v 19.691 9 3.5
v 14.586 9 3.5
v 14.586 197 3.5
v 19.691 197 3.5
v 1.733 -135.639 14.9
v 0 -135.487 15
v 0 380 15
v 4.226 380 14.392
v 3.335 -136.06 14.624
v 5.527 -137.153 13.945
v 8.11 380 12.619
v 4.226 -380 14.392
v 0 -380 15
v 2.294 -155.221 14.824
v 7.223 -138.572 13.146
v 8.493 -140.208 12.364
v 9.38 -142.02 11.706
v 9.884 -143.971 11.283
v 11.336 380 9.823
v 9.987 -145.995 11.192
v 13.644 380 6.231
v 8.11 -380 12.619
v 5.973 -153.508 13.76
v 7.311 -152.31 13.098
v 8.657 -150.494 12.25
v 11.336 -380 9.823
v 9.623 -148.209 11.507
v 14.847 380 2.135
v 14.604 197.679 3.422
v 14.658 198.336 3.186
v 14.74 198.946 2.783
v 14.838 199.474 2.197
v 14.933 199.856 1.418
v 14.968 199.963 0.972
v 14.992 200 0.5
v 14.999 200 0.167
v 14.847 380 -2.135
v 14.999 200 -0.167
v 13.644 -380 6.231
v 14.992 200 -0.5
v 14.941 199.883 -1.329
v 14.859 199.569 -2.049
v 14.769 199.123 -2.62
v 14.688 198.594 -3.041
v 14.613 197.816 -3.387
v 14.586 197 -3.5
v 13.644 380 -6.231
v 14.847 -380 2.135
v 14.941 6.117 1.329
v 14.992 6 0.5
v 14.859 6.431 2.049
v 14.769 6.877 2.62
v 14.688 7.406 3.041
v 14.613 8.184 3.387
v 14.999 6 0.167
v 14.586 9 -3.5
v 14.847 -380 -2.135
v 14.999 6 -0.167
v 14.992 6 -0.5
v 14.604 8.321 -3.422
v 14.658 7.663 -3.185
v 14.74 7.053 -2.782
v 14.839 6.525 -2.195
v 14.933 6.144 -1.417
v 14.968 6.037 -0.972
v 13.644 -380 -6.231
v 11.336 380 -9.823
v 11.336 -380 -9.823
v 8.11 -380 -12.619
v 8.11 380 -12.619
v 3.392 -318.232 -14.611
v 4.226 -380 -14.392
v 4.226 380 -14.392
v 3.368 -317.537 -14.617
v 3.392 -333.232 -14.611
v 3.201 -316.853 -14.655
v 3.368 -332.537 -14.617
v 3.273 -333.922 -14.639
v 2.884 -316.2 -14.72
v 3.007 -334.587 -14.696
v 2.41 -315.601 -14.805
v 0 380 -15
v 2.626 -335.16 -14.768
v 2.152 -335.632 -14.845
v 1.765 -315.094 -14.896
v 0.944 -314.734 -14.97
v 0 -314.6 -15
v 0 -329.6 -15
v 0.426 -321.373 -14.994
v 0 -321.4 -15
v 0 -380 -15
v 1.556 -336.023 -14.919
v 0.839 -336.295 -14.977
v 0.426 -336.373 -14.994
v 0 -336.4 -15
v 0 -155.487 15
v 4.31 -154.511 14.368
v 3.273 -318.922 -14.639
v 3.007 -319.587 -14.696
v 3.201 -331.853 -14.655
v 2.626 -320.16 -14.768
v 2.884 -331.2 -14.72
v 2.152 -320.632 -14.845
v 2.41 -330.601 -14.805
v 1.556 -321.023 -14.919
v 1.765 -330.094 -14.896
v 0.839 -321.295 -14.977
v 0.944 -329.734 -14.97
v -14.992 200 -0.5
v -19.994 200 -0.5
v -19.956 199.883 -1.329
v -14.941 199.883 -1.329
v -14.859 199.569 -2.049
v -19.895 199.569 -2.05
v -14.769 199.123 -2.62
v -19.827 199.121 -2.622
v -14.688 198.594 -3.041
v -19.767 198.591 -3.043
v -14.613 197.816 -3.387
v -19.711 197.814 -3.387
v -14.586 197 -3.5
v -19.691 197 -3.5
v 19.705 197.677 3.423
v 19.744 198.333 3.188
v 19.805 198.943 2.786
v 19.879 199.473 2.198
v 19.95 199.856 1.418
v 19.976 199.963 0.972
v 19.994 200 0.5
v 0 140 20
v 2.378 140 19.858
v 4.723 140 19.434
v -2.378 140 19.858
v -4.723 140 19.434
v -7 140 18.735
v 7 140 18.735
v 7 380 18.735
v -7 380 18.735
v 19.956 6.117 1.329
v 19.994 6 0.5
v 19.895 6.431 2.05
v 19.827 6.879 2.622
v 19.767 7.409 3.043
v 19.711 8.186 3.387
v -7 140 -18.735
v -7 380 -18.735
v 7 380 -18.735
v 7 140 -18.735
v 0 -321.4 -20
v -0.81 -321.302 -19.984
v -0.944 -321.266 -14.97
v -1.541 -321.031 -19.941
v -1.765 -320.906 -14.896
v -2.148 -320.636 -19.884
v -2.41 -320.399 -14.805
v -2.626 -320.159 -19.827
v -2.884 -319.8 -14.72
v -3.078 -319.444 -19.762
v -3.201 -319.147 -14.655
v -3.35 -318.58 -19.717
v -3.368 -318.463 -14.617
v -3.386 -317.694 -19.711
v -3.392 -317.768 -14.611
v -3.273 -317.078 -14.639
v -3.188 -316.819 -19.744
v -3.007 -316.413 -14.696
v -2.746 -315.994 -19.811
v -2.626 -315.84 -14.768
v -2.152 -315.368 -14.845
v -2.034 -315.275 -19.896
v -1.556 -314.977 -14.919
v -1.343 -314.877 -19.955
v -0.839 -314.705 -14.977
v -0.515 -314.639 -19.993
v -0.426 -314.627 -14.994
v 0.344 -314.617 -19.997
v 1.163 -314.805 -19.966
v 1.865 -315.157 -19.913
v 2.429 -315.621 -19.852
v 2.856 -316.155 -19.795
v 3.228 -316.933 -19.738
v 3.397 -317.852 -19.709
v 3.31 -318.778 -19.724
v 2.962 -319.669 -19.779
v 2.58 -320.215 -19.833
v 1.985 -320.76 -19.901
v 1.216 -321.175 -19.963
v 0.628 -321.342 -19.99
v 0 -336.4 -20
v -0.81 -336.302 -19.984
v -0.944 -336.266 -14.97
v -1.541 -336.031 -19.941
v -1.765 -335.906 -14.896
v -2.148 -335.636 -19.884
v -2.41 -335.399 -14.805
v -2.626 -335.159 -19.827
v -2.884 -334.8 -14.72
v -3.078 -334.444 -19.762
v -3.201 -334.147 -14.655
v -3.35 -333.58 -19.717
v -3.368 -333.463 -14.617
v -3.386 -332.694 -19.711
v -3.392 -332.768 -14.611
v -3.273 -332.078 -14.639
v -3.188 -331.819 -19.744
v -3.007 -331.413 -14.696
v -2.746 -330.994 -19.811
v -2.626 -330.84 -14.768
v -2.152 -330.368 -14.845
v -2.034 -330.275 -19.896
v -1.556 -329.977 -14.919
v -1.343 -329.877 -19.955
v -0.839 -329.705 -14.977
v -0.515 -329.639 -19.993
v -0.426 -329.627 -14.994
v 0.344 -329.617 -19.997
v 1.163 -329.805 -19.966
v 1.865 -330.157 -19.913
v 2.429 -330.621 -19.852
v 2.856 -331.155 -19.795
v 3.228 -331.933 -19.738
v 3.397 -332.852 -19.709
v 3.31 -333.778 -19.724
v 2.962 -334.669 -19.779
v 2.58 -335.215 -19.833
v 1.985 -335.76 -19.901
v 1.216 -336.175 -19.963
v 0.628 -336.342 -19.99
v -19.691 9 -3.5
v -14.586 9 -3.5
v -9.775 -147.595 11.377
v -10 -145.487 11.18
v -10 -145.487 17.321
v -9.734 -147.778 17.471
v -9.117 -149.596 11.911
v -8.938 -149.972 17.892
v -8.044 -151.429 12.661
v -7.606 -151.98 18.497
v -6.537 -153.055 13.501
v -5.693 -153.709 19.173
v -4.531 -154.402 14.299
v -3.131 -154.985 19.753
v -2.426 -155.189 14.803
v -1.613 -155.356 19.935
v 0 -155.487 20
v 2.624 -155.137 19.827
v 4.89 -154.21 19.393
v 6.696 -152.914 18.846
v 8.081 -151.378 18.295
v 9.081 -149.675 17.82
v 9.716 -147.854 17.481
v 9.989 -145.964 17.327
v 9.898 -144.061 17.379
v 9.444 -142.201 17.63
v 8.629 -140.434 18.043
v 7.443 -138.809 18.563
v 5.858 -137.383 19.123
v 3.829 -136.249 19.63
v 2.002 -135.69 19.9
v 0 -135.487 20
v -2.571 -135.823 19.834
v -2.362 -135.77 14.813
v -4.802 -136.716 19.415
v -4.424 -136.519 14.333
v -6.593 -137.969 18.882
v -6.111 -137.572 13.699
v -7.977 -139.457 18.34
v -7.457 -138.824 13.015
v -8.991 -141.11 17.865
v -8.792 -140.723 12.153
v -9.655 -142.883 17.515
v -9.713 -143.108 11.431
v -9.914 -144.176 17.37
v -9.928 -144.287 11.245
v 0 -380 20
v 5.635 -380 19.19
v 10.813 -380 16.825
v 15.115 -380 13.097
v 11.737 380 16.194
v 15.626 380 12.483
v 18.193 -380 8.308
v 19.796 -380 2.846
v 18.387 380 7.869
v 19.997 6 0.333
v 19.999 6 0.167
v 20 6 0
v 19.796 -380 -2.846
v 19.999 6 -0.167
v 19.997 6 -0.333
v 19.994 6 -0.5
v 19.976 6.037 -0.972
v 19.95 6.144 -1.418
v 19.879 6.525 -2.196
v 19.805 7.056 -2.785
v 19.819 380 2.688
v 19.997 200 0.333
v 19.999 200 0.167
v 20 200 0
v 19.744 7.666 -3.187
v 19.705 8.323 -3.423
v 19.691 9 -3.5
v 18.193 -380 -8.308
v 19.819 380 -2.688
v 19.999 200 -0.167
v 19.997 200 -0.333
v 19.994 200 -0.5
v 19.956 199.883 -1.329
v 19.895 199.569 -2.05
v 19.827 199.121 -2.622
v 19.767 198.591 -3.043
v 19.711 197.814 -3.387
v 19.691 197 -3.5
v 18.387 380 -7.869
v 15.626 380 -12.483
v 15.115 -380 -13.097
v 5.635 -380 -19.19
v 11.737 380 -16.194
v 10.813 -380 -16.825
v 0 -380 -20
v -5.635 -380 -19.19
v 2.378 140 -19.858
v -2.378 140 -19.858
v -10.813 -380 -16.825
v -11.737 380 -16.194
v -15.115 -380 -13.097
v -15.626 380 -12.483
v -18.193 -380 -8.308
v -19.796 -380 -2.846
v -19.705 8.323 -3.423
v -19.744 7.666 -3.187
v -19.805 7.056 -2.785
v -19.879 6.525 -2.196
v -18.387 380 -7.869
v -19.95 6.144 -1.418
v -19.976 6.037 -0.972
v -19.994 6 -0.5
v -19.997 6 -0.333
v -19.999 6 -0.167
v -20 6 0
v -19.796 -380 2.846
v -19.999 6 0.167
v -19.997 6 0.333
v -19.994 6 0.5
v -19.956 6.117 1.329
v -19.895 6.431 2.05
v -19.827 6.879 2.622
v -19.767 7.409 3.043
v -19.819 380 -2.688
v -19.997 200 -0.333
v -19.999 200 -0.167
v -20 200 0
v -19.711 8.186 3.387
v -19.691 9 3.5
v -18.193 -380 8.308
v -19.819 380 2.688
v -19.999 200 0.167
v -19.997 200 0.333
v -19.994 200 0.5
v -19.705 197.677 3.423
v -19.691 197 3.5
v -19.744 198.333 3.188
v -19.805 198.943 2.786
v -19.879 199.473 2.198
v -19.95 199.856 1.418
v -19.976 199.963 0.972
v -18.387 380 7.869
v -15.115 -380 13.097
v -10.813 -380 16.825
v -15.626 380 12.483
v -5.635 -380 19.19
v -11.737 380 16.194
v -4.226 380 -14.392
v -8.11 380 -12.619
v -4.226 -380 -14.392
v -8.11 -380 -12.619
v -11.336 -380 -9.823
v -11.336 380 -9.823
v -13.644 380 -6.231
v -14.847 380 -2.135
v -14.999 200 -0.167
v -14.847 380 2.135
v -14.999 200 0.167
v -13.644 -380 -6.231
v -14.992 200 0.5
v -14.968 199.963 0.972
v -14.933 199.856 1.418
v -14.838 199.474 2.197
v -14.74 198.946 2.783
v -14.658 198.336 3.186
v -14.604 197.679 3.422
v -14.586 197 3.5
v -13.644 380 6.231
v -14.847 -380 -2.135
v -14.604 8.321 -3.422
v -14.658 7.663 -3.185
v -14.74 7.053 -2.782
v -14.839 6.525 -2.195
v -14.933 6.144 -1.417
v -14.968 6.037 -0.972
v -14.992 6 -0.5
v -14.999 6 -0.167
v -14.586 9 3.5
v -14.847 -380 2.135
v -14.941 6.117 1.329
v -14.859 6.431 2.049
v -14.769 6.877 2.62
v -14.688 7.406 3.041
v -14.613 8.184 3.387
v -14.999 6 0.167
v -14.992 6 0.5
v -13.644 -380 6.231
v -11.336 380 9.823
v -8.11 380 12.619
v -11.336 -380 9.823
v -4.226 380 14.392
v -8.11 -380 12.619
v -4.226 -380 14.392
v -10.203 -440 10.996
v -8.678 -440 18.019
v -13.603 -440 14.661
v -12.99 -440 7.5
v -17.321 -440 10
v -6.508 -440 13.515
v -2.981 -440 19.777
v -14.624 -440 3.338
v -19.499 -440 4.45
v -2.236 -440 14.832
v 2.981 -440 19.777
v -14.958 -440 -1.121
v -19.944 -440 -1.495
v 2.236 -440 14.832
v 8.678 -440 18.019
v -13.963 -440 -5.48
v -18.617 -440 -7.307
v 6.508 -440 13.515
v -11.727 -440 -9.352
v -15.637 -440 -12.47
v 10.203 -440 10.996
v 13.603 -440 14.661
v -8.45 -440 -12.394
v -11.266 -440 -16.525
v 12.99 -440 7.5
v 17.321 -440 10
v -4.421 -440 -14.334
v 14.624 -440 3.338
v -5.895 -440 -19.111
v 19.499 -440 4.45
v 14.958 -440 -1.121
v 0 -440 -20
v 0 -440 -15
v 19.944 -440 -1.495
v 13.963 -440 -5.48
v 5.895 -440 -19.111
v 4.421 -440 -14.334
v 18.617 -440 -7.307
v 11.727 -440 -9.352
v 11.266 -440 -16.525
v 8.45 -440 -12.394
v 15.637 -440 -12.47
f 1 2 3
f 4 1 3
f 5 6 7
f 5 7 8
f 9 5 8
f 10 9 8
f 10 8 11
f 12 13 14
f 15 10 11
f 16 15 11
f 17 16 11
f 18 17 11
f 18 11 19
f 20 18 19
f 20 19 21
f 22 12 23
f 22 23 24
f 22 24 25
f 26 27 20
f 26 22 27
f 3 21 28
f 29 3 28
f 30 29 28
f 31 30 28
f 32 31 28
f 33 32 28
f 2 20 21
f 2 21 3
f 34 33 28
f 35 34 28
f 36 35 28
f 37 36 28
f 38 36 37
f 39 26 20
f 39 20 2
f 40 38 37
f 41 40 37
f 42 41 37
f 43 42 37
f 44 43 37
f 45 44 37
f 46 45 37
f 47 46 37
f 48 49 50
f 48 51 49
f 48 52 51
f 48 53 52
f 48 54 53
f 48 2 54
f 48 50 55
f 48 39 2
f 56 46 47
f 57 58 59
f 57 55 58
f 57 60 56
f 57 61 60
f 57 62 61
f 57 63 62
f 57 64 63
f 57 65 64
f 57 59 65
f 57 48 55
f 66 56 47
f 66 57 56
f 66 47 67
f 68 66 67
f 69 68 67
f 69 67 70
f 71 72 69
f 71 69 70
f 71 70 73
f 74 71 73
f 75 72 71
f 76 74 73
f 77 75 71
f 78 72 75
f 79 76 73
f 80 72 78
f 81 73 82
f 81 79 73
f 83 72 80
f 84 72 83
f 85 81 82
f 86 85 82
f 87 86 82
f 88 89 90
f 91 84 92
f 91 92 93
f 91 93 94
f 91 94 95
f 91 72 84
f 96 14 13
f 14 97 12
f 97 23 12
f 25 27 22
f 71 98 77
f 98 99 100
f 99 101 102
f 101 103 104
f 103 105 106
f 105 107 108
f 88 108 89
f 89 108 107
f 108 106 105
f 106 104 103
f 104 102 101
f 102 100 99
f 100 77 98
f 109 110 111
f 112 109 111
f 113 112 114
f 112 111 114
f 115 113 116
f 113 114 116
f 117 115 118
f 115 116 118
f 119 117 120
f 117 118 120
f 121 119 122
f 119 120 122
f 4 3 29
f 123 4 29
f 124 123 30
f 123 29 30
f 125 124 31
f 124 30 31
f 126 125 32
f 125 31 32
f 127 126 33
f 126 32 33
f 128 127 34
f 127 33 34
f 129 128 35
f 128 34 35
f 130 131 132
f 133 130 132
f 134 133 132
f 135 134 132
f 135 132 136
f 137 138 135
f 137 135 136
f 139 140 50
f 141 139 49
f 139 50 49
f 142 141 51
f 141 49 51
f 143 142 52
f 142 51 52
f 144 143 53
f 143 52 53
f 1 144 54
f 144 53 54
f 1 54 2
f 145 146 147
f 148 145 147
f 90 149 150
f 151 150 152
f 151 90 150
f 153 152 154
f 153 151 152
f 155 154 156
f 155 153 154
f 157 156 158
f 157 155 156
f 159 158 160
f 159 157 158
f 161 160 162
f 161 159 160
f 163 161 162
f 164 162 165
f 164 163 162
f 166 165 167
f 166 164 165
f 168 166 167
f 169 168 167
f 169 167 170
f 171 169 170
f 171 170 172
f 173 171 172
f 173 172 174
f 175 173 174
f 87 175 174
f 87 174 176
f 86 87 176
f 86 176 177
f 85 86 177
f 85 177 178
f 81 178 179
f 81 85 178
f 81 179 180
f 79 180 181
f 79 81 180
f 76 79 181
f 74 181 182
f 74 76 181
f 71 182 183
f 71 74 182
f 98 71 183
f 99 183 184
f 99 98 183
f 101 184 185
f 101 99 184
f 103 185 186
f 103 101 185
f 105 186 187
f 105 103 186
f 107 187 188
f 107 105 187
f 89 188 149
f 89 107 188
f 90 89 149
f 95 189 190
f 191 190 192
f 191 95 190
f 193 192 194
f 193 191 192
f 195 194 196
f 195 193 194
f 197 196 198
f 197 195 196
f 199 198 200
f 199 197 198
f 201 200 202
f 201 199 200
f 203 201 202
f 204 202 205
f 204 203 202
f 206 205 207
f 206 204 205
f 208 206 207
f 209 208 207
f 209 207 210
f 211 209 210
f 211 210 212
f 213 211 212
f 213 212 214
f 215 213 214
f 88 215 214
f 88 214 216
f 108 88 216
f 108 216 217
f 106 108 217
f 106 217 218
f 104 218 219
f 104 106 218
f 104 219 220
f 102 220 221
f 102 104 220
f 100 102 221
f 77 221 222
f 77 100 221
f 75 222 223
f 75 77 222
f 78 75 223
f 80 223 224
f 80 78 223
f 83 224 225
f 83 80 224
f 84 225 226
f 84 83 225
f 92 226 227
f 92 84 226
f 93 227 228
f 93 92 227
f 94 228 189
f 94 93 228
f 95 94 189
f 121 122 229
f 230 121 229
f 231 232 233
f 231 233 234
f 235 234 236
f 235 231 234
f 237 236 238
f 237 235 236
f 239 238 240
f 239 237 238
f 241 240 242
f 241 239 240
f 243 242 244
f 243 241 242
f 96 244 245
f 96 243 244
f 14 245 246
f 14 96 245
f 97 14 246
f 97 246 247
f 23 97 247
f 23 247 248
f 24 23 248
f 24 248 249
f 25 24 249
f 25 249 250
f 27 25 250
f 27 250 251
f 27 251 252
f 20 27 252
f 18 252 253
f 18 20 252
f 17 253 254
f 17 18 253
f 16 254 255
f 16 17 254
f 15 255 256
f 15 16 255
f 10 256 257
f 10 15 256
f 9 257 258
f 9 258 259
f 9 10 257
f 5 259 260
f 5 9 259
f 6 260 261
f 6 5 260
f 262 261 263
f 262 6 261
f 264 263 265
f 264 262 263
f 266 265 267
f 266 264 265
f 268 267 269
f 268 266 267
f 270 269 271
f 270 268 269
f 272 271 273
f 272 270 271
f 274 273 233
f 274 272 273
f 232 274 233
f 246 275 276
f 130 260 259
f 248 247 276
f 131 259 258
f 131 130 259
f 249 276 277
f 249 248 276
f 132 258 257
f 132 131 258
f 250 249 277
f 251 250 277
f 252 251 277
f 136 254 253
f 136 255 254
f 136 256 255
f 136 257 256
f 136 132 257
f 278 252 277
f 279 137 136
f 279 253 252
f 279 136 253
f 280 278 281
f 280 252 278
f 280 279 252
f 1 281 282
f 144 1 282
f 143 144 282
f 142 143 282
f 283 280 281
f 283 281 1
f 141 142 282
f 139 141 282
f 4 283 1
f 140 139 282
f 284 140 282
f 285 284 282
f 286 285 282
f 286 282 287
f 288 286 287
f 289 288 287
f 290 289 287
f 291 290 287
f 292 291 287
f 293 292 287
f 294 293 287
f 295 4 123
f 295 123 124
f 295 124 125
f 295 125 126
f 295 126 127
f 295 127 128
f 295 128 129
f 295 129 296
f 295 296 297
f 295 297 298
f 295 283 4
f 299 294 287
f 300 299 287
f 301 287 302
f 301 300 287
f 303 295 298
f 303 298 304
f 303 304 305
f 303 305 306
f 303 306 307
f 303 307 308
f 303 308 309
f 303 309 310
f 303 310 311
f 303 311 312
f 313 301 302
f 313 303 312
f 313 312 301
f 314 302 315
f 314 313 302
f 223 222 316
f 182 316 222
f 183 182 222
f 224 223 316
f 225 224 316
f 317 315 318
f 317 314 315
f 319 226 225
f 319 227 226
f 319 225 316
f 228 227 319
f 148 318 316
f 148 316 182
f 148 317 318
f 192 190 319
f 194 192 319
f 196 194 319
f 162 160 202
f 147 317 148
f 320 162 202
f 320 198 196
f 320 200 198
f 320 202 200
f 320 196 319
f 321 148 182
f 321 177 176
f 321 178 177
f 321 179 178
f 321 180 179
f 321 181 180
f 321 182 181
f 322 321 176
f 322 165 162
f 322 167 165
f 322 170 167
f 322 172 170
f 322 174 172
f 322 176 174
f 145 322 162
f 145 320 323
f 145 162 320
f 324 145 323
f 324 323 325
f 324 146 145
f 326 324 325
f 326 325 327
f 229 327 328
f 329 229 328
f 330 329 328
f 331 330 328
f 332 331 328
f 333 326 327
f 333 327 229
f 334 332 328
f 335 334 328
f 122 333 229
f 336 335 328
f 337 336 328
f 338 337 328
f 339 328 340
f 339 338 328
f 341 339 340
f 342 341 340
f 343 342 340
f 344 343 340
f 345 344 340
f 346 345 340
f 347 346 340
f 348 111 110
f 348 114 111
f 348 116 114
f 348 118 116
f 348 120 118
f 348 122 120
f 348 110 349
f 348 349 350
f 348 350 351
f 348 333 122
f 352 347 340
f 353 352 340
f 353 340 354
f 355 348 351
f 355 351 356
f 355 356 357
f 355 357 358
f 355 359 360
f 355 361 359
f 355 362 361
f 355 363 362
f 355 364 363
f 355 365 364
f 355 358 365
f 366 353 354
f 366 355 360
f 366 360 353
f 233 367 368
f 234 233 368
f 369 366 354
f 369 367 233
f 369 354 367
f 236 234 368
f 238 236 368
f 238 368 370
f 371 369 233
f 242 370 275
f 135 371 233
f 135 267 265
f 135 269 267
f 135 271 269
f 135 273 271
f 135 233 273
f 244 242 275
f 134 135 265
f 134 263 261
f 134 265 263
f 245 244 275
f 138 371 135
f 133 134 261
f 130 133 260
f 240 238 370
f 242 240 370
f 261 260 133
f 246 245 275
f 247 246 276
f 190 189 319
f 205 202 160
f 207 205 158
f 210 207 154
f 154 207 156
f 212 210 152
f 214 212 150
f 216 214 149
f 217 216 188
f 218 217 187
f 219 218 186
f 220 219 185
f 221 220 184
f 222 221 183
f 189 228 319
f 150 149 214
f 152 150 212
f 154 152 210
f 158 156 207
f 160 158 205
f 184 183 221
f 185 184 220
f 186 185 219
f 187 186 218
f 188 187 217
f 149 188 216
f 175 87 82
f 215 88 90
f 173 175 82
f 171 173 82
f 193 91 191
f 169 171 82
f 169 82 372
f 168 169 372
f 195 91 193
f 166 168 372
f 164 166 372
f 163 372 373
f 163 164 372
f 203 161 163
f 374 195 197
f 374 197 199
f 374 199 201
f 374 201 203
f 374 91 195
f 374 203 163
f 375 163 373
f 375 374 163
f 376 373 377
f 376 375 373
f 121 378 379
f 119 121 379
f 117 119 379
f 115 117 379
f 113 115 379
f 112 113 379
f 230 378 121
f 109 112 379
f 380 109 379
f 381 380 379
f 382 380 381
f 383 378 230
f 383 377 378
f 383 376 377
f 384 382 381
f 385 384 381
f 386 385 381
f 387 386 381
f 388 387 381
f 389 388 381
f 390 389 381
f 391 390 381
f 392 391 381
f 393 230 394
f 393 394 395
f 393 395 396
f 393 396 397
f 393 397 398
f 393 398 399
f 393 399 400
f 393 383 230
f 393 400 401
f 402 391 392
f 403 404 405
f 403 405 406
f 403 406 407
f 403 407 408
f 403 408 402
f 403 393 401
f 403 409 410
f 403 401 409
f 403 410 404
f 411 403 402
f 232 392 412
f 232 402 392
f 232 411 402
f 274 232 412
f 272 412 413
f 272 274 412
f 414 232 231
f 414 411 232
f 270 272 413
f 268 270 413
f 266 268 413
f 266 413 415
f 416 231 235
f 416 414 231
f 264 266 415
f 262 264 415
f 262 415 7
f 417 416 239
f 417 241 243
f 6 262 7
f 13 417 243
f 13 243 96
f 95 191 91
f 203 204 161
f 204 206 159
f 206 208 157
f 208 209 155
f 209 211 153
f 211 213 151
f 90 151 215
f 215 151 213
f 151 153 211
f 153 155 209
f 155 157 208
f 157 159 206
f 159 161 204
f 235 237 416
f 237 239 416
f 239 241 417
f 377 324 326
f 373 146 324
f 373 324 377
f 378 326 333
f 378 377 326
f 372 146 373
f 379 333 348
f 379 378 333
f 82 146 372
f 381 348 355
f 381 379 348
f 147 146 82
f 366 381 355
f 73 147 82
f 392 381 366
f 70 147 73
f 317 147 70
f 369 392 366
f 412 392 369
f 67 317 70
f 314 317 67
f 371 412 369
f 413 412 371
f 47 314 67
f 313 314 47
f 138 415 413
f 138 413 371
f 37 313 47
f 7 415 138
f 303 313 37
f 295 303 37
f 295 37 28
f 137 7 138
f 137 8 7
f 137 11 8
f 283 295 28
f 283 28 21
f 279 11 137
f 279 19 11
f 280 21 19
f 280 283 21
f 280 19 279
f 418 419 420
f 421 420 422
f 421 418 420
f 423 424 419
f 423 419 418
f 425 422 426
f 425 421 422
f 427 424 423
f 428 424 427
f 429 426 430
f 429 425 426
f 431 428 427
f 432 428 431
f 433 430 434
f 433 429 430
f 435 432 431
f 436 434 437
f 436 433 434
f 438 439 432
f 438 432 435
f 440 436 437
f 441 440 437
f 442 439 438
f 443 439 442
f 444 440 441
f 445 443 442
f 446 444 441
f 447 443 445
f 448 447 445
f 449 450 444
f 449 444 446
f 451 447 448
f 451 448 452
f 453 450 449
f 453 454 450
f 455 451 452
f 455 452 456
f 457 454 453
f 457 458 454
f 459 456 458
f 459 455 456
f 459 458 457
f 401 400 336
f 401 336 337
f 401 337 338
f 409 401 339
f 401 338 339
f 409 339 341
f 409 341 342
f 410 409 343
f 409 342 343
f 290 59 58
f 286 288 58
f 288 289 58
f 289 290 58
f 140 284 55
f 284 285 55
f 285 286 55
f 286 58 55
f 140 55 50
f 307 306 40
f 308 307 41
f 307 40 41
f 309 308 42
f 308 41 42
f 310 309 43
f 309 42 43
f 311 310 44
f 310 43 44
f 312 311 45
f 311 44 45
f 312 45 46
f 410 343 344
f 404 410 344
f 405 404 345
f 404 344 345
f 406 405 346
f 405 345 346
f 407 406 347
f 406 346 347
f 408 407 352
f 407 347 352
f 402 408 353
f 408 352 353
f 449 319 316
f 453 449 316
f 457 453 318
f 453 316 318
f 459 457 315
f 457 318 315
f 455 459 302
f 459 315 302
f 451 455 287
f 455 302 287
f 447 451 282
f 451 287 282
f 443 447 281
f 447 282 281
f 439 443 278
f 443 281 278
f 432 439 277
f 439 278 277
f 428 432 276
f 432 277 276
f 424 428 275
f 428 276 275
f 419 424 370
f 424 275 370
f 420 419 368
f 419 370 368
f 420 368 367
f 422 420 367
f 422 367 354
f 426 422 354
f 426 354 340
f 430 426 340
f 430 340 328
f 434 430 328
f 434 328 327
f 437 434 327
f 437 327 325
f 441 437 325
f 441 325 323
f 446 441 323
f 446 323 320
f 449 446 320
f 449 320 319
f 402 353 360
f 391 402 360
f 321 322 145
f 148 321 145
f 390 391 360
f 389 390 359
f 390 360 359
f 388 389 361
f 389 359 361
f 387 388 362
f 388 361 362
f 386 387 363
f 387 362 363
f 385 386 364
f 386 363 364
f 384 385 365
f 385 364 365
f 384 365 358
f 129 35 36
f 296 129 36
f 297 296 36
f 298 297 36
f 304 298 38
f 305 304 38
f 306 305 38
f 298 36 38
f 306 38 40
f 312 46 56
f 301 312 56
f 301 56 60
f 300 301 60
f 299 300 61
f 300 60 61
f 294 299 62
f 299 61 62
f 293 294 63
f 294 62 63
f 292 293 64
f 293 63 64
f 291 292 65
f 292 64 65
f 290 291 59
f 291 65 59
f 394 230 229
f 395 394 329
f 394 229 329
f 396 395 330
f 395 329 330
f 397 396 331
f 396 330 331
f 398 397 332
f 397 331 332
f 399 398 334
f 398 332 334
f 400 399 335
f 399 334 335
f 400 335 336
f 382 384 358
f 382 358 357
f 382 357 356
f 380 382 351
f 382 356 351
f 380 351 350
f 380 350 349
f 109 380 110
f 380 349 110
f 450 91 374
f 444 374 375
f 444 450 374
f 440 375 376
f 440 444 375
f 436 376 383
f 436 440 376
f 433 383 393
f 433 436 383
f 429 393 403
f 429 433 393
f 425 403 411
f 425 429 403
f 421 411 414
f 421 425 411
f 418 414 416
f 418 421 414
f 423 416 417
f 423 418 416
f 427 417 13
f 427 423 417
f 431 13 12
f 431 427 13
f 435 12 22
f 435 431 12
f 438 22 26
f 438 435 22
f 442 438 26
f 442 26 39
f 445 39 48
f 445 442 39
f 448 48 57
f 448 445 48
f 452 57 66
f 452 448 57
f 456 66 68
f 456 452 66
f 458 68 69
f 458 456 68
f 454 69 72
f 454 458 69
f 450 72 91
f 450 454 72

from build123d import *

# Parameters (mm, degrees)
SKETCH1_R                = 20
SKETCH1_R_2              = 15
BOSS_EXTRUDE1_DEPTH      = 380
SKETCH8_R                = 20
BOSS_EXTRUDE3_DEPTH      = 60
CUT_EXTRUDE2_START       = -899.5
SKETCH9_R                = 15
CUT_EXTRUDE2_DEPTH       = 899.5
CUT_EXTRUDE16_DEPTH      = 240
CUT_EXTRUDE17_DEPTH      = 20
CUT_EXTRUDE17_DEPTH_BACK = 20
CUT_EXTRUDE19_DEPTH      = 10
CUT_EXTRUDE19_DEPTH_BACK = 10
SKETCH26_R               = 10
CUT_EXTRUDE20_DEPTH      = 30
CUT_EXTRUDE20_DEPTH_BACK = 20
SKETCH27_R               = 3.4


with BuildPart() as part:
    # Sketch1 → Boss-Extrude1 (new, symmetric)
    with BuildSketch(Plane(origin=(0, 0, 0), x_dir=(1, 0, 0), z_dir=(0, 1, 0))):
        Circle(SKETCH1_R)
        Circle(SKETCH1_R_2, mode=Mode.SUBTRACT)
    extrude(amount=BOSS_EXTRUDE1_DEPTH, both=True)

    # Sketch8 → Boss-Extrude3 (add)
    with BuildSketch(Plane.XZ.offset(380)):
        Circle(SKETCH8_R)
    extrude(amount=BOSS_EXTRUDE3_DEPTH)

    # Sketch9 → Cut-Extrude2 (cut)
    with BuildSketch(Plane(origin=(-32.302786122, 416.289190775, -45.221901395), x_dir=(-0.9768887275019512, 0, 0.2137484832217963), z_dir=(0, 1, 0)).offset(CUT_EXTRUDE2_START)):
        with Locations((-21.890114798, 51.081437247)):
            Circle(SKETCH9_R)
    extrude(amount=CUT_EXTRUDE2_DEPTH, mode=Mode.SUBTRACT)

    # Sketch23 → Cut-Extrude16 (cut)
    with BuildSketch(Plane(origin=(0, 380, 0), x_dir=(1, 0, 0), z_dir=(0, 1, 0))):
        with BuildLine():
            Line((-7, 18.734993995), (7, 18.734993995))
            ThreePointArc((7, 18.734993995), (0, 20), (-7, 18.734993995))
        make_face()
    cut_extrude16 = extrude(amount=-CUT_EXTRUDE16_DEPTH, mode=Mode.SUBTRACT)

    # Mirror1: Cut-Extrude16 across plane
    add(cut_extrude16.mirror(Plane.XY), mode=Mode.SUBTRACT)

    # Sketch24 → Cut-Extrude17 (cut, two sides: drawn at the far end of the back side and taken through both)
    with BuildSketch(Plane(origin=(0, 0, 0), x_dir=(0, 0, -1), z_dir=(1, 0, 0)).offset(-CUT_EXTRUDE17_DEPTH_BACK)):
        with BuildLine():
            Line((-0.5, 200), (0.5, 200))
            ThreePointArc((0.5, 200), (2.621320344, 199.121320344), (3.5, 197))
            Line((3.5, 197), (3.5, 9))
            ThreePointArc((3.5, 9), (2.621320344, 6.878679656), (0.5, 6))
            Line((0.5, 6), (-0.5, 6))
            ThreePointArc((-0.5, 6), (-2.621320344, 6.878679656), (-3.5, 9))
            Line((-3.5, 9), (-3.5, 197))
            ThreePointArc((-3.5, 197), (-2.621320344, 199.121320344), (-0.5, 200))
        make_face()
    extrude(amount=CUT_EXTRUDE17_DEPTH + CUT_EXTRUDE17_DEPTH_BACK, mode=Mode.SUBTRACT)

    # Sketch26 → Cut-Extrude19 (cut, two sides: drawn at the far end of the back side and taken through both)
    with BuildSketch(Plane(origin=(0, -44.33037899, 18.734993995), x_dir=(1, 0, 0), z_dir=(0, 0, 1)).offset(-CUT_EXTRUDE19_DEPTH_BACK)):
        with Locations((0, -101.15698714)):
            Circle(SKETCH26_R)
    extrude(amount=CUT_EXTRUDE19_DEPTH + CUT_EXTRUDE19_DEPTH_BACK, mode=Mode.SUBTRACT)

    # Sketch27 → Cut-Extrude20 (cut, two sides: drawn at the far end of the back side and taken through both)
    with BuildSketch(Plane(origin=(0, -44.33037899, -18.734993995), x_dir=(-1, 0, 0), z_dir=(0, 0, -1)).offset(-CUT_EXTRUDE20_DEPTH_BACK)):
        with Locations((0, -273.66962101)):
            Circle(SKETCH27_R)
        with Locations((0, -288.66962101)):
            Circle(SKETCH27_R)
    extrude(amount=CUT_EXTRUDE20_DEPTH + CUT_EXTRUDE20_DEPTH_BACK, mode=Mode.SUBTRACT)


solid = part.part
